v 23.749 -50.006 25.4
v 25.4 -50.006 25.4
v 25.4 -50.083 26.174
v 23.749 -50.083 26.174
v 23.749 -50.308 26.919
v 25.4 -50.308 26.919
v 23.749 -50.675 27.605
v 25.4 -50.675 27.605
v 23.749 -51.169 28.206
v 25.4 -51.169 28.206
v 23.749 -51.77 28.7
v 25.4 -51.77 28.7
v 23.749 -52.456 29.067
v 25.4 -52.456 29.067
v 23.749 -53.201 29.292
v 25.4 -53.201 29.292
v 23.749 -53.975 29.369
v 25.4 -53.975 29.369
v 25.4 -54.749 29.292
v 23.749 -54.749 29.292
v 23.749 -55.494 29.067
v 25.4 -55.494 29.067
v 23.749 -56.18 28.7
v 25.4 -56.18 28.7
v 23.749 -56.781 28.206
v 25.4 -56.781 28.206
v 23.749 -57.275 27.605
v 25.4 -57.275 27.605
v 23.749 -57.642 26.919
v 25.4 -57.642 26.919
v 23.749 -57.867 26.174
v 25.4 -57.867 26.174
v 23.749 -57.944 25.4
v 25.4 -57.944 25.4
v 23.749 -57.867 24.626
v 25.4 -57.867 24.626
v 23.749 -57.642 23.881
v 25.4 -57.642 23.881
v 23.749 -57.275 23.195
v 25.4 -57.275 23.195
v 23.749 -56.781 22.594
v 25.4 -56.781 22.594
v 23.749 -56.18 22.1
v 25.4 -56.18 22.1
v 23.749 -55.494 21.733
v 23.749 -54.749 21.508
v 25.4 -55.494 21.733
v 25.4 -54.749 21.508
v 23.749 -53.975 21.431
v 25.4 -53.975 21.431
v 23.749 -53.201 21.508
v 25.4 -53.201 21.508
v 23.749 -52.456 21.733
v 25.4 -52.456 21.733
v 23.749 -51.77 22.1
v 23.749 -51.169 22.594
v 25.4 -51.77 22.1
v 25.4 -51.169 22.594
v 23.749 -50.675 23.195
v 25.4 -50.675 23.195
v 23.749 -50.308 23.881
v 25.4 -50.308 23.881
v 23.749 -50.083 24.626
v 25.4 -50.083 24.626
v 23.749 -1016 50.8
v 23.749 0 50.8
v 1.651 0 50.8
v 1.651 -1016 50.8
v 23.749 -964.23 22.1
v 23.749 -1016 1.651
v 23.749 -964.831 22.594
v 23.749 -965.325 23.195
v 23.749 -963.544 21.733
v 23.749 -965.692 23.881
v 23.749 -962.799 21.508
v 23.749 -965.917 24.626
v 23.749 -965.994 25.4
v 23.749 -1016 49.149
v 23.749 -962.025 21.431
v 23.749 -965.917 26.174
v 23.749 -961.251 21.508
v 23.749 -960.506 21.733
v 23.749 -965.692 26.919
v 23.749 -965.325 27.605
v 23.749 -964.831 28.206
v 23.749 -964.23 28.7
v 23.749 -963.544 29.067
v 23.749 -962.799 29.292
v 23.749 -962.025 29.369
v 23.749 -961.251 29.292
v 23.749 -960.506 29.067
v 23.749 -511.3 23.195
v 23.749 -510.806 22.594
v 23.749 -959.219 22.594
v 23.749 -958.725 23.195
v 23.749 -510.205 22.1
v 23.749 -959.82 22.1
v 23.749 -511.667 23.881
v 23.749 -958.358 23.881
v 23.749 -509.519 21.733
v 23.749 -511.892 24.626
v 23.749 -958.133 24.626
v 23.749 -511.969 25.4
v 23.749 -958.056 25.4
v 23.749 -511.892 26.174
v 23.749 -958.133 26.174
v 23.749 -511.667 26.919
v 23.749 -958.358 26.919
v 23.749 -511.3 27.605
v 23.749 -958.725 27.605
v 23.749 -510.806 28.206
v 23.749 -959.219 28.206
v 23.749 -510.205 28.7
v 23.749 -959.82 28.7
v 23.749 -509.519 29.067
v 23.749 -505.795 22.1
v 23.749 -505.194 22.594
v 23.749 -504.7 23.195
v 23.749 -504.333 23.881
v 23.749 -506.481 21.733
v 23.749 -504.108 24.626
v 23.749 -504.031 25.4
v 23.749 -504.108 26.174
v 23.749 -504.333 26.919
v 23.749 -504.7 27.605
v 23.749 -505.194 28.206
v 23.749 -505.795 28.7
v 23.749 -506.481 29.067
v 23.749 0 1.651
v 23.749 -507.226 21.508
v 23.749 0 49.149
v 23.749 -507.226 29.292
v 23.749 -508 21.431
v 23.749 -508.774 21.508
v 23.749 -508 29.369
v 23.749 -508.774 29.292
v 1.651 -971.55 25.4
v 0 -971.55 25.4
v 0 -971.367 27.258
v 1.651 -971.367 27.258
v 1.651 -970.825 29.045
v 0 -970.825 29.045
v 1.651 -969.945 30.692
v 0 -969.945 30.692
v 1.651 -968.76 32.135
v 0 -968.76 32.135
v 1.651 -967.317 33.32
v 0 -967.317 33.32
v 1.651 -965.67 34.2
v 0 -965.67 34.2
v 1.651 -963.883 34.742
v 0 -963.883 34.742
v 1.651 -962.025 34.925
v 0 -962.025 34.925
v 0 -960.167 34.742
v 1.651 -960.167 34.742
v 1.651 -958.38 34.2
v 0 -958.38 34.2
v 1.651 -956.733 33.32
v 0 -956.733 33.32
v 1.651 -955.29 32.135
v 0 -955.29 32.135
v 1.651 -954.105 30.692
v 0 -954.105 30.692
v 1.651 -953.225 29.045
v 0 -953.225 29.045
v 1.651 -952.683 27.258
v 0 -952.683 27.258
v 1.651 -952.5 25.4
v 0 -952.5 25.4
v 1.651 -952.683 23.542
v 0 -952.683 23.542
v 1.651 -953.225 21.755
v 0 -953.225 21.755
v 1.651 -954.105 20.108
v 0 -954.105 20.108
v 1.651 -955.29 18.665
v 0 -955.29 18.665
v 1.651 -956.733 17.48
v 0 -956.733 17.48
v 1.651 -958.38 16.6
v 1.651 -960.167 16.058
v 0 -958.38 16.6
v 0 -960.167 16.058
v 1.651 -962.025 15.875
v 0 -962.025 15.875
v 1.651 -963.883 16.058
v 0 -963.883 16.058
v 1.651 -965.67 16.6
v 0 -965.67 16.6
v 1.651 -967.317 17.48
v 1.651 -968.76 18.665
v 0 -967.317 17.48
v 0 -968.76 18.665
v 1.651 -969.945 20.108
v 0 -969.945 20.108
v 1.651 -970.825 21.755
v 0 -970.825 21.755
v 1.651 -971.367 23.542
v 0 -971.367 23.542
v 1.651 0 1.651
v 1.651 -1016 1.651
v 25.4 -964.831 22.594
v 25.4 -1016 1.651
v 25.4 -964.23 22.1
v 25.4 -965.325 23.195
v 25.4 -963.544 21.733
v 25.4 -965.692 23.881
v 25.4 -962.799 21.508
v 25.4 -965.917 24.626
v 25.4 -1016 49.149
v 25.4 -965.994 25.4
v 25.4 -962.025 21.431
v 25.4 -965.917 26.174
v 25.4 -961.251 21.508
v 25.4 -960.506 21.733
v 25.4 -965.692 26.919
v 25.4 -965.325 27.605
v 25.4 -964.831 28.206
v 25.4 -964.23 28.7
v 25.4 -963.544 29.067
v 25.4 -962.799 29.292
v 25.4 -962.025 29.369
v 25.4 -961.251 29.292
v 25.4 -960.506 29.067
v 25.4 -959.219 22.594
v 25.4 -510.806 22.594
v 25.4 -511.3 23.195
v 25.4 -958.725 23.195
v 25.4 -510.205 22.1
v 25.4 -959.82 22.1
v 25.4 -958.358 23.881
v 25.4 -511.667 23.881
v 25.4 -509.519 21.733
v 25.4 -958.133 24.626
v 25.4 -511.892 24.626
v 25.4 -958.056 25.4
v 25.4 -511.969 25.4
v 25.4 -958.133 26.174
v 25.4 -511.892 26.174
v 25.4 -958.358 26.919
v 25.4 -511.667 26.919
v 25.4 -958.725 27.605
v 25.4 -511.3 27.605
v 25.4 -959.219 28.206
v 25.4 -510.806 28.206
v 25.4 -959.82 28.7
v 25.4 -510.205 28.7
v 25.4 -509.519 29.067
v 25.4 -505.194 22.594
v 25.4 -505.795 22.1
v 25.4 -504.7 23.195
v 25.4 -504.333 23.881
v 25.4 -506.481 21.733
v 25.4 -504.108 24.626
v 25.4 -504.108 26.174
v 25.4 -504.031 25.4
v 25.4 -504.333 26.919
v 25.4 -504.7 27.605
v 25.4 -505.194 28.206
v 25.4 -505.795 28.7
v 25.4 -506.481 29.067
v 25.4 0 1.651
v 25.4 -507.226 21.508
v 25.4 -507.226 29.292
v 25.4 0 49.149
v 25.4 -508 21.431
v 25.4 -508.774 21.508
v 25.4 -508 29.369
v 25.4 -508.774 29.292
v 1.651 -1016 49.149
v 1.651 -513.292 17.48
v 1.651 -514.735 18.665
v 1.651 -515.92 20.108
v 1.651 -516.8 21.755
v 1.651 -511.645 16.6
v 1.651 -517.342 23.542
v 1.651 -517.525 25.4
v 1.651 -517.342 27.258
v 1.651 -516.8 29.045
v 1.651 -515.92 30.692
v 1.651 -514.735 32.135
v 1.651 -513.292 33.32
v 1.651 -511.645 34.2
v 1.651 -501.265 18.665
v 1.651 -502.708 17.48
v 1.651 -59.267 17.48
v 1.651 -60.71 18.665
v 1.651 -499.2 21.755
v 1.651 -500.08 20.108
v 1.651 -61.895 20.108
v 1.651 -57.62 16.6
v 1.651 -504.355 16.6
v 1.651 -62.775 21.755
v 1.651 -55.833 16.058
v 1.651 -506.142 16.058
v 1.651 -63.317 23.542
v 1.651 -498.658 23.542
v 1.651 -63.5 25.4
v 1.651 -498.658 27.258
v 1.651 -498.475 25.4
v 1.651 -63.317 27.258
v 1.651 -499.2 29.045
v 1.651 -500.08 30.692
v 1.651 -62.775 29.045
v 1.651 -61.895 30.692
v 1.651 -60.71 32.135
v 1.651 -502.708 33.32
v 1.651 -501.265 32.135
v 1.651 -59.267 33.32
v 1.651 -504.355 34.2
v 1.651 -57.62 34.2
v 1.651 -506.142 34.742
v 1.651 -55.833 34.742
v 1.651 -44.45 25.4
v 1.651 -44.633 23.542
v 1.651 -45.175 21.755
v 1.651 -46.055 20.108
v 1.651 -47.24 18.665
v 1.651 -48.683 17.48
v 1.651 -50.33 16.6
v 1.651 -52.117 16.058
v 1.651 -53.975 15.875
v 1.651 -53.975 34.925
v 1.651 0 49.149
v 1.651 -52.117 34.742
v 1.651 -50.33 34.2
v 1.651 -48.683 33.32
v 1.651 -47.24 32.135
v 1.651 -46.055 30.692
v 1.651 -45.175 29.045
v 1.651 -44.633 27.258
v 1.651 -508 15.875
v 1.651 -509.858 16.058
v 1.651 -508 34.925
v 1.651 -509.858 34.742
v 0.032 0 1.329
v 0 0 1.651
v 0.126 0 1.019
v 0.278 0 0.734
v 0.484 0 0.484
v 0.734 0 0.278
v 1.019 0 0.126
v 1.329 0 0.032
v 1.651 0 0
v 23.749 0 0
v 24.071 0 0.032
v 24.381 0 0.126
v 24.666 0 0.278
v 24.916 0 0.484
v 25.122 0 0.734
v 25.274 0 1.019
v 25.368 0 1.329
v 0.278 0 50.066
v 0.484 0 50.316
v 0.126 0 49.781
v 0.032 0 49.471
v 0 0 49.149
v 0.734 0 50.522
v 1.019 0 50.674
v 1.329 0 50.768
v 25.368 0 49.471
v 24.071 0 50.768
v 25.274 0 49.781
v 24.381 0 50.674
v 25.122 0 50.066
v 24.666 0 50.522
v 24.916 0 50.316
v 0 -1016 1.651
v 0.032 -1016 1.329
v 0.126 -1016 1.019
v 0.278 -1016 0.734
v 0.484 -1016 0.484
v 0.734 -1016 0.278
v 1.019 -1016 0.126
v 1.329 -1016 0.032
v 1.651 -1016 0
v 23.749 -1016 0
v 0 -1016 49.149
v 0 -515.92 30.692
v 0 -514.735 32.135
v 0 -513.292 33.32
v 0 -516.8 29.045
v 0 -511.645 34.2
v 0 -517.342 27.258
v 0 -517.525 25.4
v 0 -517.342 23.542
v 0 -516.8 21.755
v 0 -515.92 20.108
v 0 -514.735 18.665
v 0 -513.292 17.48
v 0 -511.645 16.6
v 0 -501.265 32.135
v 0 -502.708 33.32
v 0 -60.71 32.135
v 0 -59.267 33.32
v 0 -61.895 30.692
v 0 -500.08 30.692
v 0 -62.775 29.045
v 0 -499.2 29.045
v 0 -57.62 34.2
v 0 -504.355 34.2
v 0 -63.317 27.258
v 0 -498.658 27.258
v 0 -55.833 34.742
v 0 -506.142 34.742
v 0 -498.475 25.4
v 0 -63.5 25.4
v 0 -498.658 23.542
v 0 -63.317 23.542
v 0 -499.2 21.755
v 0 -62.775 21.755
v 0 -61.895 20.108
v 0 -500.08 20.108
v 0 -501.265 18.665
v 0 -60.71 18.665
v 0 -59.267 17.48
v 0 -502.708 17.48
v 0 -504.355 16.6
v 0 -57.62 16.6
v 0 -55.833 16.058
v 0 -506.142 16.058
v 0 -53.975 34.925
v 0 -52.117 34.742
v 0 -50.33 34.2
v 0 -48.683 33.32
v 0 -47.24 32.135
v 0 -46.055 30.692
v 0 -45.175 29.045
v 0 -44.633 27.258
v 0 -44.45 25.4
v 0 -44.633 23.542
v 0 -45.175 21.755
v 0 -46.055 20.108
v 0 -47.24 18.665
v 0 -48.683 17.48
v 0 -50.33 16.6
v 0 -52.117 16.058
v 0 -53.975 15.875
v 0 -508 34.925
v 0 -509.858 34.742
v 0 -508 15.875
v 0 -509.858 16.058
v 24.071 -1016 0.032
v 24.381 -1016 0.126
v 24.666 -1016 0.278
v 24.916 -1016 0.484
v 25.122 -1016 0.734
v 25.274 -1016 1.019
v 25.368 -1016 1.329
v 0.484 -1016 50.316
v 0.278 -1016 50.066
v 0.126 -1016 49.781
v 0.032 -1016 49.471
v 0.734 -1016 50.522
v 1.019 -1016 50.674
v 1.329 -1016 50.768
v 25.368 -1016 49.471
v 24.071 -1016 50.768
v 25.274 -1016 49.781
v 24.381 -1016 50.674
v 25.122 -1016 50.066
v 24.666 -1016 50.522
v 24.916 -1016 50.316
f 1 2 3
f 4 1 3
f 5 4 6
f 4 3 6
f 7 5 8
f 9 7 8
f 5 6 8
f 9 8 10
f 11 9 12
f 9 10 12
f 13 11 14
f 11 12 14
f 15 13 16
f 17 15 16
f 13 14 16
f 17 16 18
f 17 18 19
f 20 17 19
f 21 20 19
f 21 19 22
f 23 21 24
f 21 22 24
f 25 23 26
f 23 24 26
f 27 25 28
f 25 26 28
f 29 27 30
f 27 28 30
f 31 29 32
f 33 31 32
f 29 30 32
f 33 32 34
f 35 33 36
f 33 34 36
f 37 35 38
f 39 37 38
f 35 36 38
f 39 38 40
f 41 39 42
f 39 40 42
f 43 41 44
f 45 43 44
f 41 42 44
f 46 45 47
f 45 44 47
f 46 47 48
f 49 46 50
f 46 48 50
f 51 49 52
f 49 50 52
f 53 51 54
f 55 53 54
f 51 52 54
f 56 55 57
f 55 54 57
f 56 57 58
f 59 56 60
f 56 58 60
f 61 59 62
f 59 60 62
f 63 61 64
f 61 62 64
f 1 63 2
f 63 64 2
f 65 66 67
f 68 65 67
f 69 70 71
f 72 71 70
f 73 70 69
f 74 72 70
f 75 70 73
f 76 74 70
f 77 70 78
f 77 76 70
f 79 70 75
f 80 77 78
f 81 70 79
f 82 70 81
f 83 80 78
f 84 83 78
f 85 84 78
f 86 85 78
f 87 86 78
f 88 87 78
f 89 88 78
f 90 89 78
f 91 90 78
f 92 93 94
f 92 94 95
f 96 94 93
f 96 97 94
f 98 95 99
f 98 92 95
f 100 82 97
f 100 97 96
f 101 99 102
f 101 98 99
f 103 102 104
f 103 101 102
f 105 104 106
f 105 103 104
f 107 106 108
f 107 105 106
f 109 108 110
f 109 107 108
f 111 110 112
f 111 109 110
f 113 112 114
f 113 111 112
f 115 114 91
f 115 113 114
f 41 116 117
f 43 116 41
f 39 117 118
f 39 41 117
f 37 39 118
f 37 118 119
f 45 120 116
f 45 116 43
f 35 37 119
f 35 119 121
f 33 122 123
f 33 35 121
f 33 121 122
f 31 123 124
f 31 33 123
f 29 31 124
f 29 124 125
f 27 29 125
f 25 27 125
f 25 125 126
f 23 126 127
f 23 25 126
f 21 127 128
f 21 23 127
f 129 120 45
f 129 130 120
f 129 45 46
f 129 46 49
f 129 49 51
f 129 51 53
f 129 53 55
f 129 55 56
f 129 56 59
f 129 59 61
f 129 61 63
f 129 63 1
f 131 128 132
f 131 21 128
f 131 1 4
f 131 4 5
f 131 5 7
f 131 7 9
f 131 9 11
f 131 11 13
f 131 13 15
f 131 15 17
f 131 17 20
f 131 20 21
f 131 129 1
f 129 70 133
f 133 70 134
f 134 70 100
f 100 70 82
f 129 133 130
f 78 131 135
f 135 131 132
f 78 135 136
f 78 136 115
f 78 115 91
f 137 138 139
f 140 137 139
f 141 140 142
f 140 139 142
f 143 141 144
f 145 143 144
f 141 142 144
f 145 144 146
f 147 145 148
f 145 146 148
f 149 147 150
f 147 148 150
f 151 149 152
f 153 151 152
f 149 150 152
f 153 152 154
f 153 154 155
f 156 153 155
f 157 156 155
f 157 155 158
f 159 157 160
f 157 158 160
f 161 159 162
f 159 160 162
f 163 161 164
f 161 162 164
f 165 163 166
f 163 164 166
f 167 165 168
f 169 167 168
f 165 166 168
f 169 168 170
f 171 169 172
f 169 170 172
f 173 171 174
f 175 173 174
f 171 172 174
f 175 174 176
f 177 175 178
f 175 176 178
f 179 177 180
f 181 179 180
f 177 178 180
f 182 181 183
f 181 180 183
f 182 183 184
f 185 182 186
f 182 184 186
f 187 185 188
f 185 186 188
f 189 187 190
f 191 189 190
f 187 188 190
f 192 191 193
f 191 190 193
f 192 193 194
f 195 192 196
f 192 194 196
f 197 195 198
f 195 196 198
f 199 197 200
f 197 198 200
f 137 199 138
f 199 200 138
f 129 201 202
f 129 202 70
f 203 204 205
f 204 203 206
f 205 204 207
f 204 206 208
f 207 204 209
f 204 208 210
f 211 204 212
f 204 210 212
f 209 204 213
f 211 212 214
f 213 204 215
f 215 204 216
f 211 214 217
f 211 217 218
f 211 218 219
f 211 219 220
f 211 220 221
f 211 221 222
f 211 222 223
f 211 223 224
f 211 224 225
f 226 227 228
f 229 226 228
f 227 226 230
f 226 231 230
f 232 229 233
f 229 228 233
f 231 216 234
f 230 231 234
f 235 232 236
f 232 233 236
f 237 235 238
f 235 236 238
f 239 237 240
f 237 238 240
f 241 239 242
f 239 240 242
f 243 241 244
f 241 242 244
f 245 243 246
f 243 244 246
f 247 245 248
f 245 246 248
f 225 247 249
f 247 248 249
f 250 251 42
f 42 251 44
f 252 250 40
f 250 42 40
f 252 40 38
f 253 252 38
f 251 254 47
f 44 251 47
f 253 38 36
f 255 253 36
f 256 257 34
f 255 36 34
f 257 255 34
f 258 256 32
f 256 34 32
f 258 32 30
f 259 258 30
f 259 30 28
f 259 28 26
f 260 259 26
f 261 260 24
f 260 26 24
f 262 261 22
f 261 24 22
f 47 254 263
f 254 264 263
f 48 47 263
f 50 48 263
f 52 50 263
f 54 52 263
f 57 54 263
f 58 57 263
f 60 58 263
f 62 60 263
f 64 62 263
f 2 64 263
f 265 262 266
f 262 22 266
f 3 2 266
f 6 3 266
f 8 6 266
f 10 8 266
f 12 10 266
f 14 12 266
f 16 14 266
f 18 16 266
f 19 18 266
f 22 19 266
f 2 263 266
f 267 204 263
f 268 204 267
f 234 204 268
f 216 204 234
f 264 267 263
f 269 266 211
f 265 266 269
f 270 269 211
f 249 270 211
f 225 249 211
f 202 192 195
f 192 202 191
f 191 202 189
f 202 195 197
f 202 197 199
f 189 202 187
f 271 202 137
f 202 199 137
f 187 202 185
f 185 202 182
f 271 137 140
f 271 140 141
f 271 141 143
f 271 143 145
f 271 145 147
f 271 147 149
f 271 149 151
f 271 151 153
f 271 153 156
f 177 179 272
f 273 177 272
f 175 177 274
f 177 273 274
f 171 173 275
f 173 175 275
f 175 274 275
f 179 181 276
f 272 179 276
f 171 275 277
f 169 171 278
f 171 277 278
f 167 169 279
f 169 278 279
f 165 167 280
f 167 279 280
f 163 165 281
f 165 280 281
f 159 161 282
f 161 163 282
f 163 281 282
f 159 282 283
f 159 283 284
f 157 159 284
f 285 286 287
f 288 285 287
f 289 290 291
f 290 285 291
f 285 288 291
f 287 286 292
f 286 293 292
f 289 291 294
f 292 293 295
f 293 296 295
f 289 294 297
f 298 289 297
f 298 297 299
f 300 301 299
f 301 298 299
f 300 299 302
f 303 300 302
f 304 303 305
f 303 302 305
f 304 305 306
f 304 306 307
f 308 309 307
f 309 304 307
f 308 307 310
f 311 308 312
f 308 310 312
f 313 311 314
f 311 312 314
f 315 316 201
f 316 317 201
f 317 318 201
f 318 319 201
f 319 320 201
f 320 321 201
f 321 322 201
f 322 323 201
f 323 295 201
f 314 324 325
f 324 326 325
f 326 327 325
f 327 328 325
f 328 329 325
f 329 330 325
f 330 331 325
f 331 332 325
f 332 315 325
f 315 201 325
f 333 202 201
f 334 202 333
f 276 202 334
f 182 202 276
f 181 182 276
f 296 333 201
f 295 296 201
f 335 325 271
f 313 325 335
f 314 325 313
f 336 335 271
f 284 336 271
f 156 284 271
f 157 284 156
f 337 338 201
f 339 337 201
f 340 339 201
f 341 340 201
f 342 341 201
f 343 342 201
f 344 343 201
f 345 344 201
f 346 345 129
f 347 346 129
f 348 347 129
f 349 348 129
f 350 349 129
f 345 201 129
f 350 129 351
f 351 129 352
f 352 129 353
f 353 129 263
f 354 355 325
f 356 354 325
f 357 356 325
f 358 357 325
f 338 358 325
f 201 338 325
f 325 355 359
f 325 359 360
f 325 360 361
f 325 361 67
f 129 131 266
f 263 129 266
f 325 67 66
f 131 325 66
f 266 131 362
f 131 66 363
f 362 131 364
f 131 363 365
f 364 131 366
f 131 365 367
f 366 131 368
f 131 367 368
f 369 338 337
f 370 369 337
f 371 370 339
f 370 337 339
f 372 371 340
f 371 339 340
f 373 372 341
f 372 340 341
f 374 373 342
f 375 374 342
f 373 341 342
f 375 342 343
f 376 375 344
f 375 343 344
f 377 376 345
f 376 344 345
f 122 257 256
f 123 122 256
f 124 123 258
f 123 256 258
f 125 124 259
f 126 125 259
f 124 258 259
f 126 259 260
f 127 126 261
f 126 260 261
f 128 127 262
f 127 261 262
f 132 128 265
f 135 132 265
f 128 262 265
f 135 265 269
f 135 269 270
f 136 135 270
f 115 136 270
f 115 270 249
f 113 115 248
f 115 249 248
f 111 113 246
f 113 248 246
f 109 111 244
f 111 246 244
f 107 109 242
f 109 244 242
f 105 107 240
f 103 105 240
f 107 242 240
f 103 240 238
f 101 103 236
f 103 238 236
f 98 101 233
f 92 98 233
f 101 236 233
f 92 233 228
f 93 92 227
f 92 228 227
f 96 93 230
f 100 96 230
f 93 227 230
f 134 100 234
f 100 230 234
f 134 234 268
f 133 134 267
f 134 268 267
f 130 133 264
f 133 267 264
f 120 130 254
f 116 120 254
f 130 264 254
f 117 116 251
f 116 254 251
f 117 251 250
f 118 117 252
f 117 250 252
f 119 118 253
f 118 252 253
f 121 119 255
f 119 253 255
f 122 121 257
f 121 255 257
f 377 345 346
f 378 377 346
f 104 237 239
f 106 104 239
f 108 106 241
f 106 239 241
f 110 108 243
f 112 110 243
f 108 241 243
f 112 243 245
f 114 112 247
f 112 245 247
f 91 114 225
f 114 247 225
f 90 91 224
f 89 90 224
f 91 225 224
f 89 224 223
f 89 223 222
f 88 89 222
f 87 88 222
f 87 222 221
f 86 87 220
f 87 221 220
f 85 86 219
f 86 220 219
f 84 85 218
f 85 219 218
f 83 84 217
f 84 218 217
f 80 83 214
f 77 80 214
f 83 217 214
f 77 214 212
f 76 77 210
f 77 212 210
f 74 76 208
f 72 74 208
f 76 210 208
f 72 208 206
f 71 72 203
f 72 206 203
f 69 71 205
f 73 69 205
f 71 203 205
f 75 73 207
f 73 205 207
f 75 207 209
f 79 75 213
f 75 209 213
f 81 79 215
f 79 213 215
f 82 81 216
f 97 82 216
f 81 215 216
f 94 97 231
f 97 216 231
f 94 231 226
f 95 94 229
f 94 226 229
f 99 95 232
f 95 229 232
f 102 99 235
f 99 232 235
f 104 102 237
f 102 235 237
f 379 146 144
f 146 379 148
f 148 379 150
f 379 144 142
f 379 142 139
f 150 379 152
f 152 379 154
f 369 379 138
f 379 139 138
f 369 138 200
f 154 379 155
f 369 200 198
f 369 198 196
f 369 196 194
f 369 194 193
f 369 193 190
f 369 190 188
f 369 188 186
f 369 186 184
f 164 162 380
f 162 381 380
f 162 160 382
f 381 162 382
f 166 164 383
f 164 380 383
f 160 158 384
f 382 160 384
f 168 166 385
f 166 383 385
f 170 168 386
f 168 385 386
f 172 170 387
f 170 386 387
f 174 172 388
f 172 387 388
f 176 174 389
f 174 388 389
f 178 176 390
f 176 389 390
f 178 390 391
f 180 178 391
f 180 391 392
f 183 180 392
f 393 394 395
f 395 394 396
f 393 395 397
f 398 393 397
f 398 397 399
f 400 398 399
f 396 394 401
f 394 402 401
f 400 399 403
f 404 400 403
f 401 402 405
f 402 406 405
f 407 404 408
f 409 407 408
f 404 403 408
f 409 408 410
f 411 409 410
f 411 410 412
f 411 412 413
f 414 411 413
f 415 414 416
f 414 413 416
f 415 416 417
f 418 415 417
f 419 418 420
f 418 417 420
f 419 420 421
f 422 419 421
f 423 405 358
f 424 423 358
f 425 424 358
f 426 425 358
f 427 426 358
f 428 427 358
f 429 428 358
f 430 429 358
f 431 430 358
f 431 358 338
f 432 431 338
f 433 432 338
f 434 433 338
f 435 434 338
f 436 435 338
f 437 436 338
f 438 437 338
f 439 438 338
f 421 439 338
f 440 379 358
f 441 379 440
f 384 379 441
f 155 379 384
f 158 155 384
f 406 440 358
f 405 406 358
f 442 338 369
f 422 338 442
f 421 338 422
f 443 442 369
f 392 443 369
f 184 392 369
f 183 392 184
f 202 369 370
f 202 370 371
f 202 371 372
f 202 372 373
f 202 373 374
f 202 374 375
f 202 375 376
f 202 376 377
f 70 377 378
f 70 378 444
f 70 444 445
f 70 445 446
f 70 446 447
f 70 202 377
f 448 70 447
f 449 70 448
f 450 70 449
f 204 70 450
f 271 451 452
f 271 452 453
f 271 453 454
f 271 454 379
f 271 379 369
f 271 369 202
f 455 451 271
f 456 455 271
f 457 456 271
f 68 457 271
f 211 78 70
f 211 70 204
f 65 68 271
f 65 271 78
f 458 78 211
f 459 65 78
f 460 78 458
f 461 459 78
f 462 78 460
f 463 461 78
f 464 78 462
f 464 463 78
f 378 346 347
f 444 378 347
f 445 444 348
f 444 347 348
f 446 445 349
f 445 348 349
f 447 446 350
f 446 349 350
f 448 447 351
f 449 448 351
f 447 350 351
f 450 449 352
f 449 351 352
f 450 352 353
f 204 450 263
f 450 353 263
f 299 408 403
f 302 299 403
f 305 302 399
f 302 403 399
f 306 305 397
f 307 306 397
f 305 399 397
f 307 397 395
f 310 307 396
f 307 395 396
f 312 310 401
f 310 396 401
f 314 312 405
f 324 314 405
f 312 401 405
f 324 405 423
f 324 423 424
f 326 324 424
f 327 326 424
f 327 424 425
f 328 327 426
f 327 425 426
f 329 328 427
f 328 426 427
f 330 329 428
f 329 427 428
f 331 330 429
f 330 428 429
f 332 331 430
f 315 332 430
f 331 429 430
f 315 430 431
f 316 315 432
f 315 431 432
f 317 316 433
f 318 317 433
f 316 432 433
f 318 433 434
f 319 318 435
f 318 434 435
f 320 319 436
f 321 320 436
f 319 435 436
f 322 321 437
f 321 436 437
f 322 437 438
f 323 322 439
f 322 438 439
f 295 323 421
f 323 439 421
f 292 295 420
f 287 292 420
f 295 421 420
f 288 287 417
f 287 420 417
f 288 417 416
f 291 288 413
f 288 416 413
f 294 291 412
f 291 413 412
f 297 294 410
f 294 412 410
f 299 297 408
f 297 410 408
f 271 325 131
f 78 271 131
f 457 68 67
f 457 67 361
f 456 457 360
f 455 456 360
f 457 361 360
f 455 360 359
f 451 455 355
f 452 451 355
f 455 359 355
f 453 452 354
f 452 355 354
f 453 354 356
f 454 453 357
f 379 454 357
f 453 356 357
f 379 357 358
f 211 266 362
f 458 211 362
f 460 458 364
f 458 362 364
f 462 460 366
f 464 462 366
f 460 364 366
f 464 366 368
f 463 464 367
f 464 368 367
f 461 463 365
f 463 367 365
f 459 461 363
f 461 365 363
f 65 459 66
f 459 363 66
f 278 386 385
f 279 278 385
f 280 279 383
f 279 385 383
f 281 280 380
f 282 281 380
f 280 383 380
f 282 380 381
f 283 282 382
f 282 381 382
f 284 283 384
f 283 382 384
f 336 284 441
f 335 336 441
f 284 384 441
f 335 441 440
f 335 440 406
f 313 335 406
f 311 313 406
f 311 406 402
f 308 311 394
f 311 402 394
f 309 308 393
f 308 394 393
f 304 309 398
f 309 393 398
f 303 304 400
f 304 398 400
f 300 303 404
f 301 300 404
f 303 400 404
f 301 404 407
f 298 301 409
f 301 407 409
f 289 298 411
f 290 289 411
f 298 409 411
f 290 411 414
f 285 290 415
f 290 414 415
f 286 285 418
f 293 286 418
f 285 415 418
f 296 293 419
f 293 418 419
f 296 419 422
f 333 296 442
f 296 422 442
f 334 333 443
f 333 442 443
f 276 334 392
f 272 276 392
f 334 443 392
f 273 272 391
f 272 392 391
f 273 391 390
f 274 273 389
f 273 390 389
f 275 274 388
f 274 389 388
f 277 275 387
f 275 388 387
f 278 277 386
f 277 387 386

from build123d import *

# Parameters (mm, degrees)
F0_W     = 22.098
F0_H     = 47.498
F1_DEPTH = 1016
F2_R     = 3.96875
F3_DEPTH = 1.651
F4_R     = 9.525
F5_DEPTH = 1.651


with BuildPart() as f1:
    # F0 (on Front) → F1 (new body)
    with BuildSketch(Plane.XZ):
        with BuildLine():
            ThreePointArc((0, 1.651), (0.483567, 0.483567), (1.651, 0))
            Line((1.651, 0), (23.749, 0))
            ThreePointArc((23.749, 0), (24.916433, 0.483567), (25.4, 1.651))
            Line((25.4, 1.651), (25.4, 49.149))
            ThreePointArc((25.4, 49.149), (24.916433, 50.316433), (23.749, 50.8))
            Line((23.749, 50.8), (1.651, 50.8))
            ThreePointArc((1.651, 50.8), (0.483567, 50.316433), (0, 49.149))
            Line((0, 49.149), (0, 1.651))
        make_face()
        with Locations((12.7, 25.4)):
            Rectangle(F0_W, F0_H, mode=Mode.SUBTRACT)
    extrude(amount=F1_DEPTH)

    # F2 (on face) → F3 (cut, through all)
    with BuildSketch(Plane.YZ.offset(25.4)):
        with Locations((-508, 25.4)):
            Circle(F2_R)
        with Locations((-53.975, 25.4)):
            Circle(F2_R)
        with Locations((-962.025, 25.4)):
            Circle(F2_R)
    extrude(amount=-F3_DEPTH, mode=Mode.SUBTRACT)

    # F4 (on face) → F5 (cut, through all)
    with BuildSketch(Plane(origin=(0, 0, 0), x_dir=(0, -1, 0), z_dir=(-1, 0, 0))):
        with Locations((508, 25.4)):
            Circle(F4_R)
        with Locations((53.975, 25.4)):
            Circle(F4_R)
        with Locations((962.025, 25.4)):
            Circle(F4_R)
    extrude(amount=-F5_DEPTH, mode=Mode.SUBTRACT)


solid = f1.part
